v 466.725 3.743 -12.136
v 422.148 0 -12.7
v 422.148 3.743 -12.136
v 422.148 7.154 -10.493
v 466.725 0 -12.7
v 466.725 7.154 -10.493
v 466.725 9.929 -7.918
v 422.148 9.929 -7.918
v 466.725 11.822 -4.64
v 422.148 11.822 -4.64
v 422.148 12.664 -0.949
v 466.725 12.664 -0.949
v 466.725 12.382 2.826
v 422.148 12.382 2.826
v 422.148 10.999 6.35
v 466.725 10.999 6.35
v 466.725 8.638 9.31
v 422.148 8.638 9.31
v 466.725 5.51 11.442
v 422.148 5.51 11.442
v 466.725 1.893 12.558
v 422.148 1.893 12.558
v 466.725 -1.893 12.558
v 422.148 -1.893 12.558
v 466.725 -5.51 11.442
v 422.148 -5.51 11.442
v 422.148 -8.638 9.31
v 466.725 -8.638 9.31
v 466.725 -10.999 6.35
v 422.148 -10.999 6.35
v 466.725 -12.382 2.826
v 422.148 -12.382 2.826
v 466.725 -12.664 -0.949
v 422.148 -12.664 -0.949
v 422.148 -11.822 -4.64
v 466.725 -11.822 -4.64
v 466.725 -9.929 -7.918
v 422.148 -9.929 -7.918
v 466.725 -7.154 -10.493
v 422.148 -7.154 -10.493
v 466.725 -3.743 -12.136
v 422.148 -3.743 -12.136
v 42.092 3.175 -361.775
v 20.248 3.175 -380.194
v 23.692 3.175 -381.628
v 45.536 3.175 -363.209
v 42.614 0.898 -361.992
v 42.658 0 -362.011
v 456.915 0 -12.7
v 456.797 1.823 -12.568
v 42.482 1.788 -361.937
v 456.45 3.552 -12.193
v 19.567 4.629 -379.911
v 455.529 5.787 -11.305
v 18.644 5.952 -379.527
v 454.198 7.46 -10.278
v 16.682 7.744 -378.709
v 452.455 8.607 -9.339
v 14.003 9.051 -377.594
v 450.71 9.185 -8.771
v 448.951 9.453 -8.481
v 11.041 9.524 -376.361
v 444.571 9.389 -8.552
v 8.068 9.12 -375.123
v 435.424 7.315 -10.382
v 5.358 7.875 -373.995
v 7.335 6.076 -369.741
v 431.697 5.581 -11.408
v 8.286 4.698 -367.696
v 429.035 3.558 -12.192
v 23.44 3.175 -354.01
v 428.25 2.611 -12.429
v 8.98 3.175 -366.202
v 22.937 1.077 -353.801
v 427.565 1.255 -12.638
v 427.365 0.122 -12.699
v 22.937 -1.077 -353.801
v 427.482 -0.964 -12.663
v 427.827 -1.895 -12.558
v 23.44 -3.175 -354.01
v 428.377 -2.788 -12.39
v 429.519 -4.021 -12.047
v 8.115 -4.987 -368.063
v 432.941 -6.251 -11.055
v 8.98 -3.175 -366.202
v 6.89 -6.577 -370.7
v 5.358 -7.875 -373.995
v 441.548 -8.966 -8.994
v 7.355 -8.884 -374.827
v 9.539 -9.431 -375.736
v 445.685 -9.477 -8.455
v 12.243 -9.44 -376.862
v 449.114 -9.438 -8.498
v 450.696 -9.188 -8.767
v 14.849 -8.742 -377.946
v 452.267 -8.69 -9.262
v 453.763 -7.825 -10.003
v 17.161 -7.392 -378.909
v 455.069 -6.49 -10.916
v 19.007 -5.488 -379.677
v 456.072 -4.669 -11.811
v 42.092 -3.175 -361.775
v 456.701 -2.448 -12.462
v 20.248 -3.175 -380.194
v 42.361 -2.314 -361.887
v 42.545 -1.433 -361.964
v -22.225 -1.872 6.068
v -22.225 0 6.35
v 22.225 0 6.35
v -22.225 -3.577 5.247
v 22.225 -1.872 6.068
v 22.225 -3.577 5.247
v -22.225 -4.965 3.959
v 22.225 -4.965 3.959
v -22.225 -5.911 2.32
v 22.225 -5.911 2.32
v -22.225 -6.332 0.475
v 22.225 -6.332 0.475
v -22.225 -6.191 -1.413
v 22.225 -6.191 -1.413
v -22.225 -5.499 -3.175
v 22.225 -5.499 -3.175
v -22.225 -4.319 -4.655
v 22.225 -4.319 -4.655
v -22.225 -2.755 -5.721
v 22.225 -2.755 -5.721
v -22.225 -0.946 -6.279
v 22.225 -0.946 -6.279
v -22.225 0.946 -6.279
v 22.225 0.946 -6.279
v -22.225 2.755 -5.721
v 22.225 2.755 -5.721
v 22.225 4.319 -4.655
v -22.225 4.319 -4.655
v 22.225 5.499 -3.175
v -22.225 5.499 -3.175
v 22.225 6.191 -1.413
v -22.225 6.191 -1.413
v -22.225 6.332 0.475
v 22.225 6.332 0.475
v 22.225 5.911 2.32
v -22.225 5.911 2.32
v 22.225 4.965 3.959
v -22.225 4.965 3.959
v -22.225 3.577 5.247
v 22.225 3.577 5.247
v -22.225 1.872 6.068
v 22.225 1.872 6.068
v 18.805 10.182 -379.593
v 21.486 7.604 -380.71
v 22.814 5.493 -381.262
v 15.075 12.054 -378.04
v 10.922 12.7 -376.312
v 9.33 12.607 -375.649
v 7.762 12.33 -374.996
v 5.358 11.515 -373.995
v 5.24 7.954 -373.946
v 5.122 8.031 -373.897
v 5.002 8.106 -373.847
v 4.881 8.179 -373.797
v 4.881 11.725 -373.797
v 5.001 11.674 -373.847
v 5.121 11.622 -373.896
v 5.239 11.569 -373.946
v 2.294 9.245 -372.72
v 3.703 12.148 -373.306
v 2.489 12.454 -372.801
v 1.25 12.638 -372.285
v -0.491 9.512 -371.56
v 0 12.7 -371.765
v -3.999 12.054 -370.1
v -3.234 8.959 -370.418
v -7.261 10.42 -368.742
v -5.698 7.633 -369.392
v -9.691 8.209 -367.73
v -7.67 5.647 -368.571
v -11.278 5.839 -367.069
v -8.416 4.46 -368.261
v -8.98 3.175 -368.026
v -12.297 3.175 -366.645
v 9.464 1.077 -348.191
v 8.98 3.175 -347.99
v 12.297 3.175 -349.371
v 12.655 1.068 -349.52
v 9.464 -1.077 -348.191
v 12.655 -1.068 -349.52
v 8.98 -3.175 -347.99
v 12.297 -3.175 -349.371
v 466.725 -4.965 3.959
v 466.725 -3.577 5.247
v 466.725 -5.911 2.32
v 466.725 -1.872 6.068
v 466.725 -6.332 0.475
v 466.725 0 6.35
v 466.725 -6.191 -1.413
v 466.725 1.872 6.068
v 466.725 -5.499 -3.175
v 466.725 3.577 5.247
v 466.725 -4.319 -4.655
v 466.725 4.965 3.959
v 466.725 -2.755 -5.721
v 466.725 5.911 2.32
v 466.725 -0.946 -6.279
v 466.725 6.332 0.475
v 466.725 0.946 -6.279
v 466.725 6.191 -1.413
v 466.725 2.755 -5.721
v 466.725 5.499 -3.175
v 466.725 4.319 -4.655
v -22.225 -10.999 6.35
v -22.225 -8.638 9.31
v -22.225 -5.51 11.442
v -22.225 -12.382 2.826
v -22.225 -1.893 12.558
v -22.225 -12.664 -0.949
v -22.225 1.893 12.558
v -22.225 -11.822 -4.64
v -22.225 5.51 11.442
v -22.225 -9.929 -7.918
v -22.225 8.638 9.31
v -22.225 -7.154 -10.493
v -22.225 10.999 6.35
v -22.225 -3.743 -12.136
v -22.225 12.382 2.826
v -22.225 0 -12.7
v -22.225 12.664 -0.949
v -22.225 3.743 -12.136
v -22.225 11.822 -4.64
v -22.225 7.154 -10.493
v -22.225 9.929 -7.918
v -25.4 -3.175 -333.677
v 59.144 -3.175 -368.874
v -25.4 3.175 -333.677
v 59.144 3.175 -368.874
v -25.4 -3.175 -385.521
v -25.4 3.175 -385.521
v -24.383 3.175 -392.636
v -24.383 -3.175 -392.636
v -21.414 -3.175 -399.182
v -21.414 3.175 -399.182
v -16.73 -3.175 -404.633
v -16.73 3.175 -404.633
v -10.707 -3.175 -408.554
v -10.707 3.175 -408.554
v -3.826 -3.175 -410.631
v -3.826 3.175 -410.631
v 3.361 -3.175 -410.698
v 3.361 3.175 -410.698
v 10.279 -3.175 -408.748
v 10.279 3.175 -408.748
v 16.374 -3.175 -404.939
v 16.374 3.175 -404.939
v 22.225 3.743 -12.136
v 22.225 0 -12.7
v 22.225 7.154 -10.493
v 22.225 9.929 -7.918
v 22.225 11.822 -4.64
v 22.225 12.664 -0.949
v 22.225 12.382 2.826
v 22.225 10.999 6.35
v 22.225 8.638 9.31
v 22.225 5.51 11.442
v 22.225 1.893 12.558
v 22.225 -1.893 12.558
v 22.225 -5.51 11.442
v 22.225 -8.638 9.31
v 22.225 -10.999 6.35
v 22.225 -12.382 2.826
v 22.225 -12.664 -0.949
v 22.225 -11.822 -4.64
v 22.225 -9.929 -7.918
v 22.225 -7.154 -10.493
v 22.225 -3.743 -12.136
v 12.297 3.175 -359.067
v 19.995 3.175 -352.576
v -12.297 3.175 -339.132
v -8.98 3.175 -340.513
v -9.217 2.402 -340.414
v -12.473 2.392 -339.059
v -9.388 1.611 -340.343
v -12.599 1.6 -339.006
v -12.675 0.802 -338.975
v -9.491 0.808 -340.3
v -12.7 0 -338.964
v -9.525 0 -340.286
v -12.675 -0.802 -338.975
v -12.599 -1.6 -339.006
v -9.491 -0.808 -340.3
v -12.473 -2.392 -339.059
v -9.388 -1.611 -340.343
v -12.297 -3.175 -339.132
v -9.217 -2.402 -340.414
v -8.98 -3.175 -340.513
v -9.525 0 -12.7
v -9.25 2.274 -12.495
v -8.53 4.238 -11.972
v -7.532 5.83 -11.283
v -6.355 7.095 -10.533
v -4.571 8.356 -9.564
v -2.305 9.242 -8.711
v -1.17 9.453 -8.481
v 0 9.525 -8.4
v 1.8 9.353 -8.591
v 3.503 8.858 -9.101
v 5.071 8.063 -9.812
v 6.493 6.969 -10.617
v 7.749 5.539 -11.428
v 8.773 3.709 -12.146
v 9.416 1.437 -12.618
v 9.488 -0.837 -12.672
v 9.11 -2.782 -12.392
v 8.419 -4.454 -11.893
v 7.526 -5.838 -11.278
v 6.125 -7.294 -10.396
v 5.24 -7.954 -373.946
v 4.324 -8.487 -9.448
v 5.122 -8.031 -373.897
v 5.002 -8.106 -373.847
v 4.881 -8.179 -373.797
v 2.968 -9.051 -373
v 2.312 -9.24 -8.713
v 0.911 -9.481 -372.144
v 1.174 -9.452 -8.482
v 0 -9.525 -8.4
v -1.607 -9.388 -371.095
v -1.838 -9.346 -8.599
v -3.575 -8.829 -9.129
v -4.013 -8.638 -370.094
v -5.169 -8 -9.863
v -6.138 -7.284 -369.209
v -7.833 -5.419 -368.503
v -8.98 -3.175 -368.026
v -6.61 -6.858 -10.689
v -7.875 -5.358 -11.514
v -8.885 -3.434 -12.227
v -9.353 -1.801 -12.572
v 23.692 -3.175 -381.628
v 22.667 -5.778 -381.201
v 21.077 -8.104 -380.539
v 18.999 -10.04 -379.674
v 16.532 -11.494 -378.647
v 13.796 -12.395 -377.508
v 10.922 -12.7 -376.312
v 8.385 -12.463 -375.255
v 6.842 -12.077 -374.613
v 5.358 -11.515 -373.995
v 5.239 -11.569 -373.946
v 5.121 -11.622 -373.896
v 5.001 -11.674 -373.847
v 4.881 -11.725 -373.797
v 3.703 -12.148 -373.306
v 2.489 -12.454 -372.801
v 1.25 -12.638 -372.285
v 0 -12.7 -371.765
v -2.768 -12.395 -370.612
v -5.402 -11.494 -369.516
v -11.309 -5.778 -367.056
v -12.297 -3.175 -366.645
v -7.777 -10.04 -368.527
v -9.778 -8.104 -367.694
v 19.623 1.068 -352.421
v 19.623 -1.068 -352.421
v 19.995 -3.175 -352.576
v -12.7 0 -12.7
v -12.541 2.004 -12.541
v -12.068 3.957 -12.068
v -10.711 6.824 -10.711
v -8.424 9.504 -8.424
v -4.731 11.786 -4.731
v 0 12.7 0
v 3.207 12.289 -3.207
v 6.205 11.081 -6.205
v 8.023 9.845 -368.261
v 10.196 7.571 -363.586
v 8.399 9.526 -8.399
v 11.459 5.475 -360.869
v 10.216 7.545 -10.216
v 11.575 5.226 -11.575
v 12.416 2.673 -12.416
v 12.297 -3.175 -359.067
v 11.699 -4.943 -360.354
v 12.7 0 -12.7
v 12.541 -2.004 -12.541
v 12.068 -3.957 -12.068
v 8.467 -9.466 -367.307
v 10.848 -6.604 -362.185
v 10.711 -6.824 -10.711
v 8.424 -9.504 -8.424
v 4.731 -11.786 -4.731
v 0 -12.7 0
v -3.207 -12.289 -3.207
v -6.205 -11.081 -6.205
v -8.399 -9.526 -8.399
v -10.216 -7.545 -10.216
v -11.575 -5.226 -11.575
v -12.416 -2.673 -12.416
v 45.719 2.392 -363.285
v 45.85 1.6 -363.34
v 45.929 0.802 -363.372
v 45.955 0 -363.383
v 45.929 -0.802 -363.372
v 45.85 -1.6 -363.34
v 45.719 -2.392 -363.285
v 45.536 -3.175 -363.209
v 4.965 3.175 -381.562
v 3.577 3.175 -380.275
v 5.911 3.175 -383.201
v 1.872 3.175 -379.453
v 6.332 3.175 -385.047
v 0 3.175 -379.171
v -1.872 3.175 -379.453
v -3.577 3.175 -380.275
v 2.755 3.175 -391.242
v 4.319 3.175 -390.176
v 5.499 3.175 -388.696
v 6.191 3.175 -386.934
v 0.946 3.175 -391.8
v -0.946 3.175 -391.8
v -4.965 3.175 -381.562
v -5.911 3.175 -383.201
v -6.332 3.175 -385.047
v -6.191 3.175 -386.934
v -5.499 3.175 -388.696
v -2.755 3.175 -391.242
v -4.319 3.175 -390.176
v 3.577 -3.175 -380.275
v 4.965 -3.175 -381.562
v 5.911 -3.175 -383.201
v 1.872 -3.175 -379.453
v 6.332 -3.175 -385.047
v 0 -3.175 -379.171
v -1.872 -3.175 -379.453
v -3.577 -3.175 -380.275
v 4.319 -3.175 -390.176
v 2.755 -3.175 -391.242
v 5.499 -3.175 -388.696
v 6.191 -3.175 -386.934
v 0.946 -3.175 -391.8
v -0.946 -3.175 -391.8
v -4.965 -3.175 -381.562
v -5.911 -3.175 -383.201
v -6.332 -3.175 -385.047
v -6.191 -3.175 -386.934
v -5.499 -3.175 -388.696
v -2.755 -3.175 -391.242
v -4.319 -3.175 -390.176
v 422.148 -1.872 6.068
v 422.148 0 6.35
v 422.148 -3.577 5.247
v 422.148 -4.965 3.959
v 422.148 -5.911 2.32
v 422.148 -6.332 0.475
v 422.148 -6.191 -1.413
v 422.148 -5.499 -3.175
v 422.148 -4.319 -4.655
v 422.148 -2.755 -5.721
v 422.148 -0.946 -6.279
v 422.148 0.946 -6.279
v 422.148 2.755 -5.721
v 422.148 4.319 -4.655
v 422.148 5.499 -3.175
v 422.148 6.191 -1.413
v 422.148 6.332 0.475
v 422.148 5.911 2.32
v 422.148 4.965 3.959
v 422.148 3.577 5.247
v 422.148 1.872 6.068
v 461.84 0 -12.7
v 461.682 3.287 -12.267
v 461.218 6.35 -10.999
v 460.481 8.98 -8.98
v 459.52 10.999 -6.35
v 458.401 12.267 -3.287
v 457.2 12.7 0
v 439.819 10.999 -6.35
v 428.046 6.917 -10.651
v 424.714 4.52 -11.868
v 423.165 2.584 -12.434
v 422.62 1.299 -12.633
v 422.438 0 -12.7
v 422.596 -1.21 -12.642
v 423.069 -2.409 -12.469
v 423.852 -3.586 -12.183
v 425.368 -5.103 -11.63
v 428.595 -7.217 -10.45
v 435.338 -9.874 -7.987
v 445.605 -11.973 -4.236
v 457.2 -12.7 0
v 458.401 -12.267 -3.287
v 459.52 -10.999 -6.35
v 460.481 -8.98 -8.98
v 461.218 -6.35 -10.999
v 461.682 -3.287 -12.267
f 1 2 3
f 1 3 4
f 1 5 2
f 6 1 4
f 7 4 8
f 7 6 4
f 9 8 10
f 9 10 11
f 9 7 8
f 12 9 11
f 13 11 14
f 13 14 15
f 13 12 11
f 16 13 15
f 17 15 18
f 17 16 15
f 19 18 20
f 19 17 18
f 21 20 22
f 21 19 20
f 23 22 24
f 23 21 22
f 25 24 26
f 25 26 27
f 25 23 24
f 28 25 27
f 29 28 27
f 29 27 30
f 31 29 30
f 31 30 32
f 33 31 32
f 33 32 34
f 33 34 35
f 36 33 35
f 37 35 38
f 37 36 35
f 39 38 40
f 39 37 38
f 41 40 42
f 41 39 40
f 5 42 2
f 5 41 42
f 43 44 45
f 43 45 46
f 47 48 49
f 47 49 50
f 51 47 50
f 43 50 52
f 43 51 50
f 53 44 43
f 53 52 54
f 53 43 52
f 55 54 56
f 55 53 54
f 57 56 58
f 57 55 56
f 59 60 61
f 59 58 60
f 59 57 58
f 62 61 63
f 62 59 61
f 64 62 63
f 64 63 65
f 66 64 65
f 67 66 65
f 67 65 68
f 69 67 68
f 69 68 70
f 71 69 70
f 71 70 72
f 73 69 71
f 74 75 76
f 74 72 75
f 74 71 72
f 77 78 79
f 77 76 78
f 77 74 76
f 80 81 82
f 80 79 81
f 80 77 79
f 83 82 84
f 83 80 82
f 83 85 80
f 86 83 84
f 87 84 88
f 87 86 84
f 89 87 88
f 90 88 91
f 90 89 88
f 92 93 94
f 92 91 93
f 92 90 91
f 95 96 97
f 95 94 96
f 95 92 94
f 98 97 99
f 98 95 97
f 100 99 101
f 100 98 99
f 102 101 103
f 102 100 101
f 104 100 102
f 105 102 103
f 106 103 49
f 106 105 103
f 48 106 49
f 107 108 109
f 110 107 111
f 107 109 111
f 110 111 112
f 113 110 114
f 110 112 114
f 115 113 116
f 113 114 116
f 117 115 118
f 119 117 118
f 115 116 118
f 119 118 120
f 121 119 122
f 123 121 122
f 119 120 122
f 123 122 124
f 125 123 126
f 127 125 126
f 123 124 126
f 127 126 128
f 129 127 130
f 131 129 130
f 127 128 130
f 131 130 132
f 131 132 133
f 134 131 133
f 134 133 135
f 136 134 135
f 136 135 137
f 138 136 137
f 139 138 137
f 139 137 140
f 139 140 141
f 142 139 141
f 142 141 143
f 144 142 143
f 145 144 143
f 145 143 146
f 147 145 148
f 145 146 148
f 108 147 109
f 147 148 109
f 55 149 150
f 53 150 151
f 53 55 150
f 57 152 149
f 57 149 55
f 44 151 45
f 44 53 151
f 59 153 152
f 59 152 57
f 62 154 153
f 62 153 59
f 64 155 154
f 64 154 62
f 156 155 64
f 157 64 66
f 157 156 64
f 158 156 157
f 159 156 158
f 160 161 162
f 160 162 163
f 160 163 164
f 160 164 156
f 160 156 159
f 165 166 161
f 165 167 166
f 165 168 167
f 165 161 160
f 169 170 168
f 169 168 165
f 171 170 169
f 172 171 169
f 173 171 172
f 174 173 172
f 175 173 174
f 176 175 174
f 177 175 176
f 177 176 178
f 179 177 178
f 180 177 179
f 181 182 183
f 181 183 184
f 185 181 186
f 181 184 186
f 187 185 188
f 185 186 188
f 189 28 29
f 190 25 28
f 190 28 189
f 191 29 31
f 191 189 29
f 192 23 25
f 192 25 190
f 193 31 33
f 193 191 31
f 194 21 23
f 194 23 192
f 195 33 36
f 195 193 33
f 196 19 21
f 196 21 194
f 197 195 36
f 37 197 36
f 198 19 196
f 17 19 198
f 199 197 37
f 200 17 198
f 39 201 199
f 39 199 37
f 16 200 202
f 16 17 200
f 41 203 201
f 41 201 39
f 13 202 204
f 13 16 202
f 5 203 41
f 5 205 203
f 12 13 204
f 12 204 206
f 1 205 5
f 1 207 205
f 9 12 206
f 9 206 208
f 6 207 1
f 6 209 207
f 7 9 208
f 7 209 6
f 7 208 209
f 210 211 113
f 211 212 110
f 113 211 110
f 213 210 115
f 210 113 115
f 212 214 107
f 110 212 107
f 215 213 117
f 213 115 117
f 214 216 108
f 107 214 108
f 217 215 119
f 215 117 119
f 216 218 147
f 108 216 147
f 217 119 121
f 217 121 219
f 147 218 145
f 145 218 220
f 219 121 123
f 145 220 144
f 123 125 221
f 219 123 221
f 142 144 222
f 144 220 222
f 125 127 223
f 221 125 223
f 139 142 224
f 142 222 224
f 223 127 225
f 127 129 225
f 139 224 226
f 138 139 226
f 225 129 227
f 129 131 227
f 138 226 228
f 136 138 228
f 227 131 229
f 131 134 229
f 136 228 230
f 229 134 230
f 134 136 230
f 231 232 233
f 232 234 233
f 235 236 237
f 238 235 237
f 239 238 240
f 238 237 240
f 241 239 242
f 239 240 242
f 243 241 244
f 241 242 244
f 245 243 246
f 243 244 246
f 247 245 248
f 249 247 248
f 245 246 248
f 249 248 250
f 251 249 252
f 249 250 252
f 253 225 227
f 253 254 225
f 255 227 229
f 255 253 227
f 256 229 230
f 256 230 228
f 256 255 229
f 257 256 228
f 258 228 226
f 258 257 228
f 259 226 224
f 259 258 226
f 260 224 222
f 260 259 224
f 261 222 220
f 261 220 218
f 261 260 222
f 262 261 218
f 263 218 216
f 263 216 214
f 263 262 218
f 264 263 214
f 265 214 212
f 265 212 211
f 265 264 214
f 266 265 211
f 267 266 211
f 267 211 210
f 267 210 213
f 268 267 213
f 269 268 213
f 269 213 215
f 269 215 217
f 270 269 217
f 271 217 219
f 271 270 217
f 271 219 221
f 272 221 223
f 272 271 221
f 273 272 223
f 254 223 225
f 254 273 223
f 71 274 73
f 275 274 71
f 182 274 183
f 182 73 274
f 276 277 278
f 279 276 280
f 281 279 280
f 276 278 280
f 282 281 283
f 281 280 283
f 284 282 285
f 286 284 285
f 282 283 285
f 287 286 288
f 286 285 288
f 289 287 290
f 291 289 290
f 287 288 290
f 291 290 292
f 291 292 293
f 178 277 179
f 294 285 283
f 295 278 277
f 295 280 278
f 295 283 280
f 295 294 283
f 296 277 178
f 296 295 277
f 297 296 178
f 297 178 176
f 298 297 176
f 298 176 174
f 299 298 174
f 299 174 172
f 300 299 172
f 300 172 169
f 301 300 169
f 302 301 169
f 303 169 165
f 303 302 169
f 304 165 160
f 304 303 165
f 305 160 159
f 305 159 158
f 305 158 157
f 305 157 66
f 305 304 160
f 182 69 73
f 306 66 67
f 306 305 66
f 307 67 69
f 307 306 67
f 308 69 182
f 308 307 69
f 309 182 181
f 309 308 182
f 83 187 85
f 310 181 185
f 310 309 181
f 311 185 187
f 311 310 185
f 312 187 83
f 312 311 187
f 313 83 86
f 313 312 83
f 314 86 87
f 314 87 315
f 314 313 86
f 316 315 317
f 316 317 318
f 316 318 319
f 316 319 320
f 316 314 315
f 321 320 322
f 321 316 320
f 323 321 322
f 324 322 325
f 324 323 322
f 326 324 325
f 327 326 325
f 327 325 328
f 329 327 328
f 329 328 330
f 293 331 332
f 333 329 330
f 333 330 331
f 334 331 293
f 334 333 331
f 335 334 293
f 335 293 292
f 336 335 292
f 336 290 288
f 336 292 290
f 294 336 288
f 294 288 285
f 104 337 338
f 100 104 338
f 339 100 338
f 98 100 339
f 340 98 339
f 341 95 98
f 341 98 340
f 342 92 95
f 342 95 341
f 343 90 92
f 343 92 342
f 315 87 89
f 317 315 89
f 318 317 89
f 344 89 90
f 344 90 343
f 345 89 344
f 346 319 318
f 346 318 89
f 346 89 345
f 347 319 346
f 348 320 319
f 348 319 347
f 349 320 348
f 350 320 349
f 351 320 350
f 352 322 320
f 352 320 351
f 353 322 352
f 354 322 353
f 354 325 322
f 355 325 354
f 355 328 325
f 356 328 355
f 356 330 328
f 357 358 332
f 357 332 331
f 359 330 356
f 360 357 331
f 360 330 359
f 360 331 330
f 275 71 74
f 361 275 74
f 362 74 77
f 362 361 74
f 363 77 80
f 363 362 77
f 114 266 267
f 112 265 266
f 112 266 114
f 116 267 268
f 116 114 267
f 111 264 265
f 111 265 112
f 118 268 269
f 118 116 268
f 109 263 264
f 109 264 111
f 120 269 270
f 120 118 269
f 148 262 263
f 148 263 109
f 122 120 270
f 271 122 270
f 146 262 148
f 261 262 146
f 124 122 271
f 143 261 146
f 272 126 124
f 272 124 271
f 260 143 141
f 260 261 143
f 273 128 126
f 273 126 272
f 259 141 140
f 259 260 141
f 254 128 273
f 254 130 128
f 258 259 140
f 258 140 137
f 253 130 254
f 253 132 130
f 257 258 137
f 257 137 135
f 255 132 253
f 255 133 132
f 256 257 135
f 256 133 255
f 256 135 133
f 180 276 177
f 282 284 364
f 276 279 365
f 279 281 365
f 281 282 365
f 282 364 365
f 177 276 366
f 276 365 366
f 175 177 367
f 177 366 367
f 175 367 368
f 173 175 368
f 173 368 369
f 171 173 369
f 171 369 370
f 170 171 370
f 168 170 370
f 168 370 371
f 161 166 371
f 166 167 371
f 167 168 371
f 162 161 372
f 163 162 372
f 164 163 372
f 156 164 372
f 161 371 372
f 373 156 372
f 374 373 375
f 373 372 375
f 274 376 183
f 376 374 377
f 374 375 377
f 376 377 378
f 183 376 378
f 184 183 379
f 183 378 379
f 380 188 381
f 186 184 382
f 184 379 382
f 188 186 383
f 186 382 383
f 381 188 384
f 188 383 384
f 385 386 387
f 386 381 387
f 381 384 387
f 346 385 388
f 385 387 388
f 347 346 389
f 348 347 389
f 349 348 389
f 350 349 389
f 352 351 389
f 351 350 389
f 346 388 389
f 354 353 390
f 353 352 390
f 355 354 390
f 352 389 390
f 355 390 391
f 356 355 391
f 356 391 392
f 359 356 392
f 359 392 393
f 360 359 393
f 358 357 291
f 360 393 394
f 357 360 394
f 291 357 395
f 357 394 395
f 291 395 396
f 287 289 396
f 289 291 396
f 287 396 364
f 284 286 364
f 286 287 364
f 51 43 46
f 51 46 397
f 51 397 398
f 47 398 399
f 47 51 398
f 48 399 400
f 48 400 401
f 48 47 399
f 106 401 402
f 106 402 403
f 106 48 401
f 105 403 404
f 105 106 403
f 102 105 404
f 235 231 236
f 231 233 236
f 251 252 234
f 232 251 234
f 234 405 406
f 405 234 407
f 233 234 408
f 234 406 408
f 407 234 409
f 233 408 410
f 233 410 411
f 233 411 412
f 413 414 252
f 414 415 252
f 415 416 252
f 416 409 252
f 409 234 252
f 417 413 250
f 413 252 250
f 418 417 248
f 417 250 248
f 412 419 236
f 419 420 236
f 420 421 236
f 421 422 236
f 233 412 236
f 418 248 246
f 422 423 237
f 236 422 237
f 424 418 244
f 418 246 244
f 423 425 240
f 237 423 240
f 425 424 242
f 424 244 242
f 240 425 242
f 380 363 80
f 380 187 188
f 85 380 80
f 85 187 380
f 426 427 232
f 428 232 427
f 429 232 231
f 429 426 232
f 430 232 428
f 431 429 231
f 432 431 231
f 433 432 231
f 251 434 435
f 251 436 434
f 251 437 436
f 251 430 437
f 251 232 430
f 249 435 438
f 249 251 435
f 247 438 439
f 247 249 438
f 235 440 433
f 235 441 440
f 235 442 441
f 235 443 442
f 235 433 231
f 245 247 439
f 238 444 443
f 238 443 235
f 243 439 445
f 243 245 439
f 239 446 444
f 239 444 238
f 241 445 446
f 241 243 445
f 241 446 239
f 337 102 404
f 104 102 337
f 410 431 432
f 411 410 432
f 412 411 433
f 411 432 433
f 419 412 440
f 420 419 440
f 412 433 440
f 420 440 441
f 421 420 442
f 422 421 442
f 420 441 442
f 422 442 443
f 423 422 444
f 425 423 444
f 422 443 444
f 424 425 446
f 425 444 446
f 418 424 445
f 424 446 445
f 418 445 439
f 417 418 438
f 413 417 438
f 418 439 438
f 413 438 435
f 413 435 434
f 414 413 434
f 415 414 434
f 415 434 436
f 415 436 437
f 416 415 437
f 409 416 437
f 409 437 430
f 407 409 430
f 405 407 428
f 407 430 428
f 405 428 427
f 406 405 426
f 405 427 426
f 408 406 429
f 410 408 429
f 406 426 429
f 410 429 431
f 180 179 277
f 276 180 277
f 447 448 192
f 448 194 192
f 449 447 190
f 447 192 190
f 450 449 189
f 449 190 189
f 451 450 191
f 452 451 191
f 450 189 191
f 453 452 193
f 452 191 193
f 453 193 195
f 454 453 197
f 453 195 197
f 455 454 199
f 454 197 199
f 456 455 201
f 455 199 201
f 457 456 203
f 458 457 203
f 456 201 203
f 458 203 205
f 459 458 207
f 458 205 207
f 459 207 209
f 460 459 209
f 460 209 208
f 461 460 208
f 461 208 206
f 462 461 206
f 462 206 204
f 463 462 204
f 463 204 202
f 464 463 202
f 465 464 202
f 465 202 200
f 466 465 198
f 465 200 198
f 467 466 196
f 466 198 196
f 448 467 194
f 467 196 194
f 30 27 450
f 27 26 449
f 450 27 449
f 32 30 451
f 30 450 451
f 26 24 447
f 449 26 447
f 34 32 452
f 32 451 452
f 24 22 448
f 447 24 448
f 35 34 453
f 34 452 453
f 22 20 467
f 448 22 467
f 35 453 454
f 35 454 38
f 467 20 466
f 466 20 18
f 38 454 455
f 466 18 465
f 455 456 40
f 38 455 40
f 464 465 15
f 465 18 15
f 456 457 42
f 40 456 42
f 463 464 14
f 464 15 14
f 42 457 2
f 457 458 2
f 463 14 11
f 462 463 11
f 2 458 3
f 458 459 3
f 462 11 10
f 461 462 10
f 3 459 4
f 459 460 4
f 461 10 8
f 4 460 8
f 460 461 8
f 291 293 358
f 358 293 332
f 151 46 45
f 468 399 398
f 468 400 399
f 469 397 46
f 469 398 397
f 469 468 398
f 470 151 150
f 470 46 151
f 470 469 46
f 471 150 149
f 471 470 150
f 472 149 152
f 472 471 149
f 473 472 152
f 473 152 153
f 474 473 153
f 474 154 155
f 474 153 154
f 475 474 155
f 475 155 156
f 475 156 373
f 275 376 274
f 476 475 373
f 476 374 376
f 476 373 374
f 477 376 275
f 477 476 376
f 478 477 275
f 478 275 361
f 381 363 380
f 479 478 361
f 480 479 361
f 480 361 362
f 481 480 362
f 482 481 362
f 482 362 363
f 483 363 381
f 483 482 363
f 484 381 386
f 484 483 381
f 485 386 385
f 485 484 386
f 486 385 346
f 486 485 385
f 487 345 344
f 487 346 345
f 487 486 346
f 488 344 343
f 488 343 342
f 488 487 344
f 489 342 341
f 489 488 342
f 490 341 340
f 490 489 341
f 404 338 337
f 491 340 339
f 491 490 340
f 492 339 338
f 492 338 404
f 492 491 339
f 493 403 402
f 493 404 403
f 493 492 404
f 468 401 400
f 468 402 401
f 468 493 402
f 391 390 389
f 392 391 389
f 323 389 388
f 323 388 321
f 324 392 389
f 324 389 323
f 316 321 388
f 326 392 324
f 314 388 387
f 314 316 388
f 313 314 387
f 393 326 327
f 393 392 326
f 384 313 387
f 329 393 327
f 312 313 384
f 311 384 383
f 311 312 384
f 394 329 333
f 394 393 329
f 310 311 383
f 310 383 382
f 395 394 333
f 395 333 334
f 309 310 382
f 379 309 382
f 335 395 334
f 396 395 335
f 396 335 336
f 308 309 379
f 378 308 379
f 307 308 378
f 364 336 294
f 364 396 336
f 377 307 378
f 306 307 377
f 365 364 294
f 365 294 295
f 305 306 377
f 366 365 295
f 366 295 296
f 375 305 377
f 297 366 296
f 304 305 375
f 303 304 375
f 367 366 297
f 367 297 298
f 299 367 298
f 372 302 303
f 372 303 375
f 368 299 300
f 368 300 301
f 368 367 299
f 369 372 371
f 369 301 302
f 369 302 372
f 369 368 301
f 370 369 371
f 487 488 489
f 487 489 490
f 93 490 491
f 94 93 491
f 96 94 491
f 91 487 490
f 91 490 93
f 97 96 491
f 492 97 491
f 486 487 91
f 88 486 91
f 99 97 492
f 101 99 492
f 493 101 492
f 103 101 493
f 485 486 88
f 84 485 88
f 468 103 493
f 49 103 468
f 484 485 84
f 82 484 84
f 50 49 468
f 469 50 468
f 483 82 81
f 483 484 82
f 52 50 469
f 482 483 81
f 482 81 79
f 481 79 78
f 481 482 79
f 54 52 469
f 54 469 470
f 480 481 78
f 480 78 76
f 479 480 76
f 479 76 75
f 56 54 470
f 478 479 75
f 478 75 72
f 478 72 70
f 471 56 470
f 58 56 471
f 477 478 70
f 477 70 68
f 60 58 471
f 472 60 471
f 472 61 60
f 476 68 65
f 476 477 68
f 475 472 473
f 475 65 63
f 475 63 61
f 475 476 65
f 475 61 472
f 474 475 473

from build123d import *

# Parameters (mm, degrees)
SKETCH11_ON_SEGMENT_1_R         = 12.7
SKETCH11_ON_SEGMENT_1_R_2       = 9.525
STRUCTURAL_MEMBER1_DEPTH        = 425.159349585
SKETCH11_R                      = 12.7
SKETCH11_R_2                    = 9.525
STRUCTURAL_MEMBER1_2_DEPTH      = 598.045513025
STRUCTURAL_MEMBER1_2_DEPTH_BACK = 39.638149585
CUT_EXTRUDE1_DEPTH              = 611.698909876
CUT_EXTRUDE1_DEPTH_BACK         = 611.698909876
BOSS_EXTRUDE1_DEPTH             = 3.175
BOSS_EXTRUDE1_DEPTH_BACK        = 3.175
SKETCH14_W                      = 6.35
SKETCH14_H                      = 15.875
SKETCH16_R                      = 12.7
CUT_EXTRUDE2_DEPTH              = 621.968967697
CUT_EXTRUDE2_DEPTH_BACK         = 621.968967697
SKETCH17_R                      = 12.7
BOSS_EXTRUDE2_DEPTH             = 22.225
BOSS_EXTRUDE2_DEPTH_BACK        = 22.225
SKETCH18_R                      = 12.7
BOSS_EXTRUDE3_DEPTH             = 9.525
BOSS_EXTRUDE3_DEPTH_BACK        = 35.052
SKETCH19_W                      = 6.35
SKETCH19_H                      = 488.95


with BuildPart() as part:
    # Sketch11 on segment 1 (carried to segment 1) → Structural Member1 (new body)
    with BuildSketch(Plane(origin=(0, 0, 0), x_dir=(-1, 0, 0), z_dir=(0, 0, -1))):
        Circle(SKETCH11_ON_SEGMENT_1_R)
        Circle(SKETCH11_ON_SEGMENT_1_R_2, mode=Mode.SUBTRACT)
    extrude(amount=STRUCTURAL_MEMBER1_DEPTH)

    # Structural Member1 mitre 1
    split(bisect_by=Plane(origin=(0, 0, -385.5212), x_dir=(0, -1, 0), z_dir=(-0.906817297, 0, 0.421523891)), keep=Keep.TOP)


with BuildPart() as body_2:
    # Sketch11 → Structural Member1 2 (new, two sides)
    with BuildSketch(Plane(origin=(0, 0, -385.5212), x_dir=(0.6446352185637546, 0, -0.7644903105908277), z_dir=(0.7644903105908278, 0, 0.6446352185637547))) as structural_member1_2_sk:
        Circle(SKETCH11_R)
        Circle(SKETCH11_R_2, mode=Mode.SUBTRACT)
    extrude(amount=STRUCTURAL_MEMBER1_2_DEPTH)
    extrude(structural_member1_2_sk.sketch, amount=-STRUCTURAL_MEMBER1_2_DEPTH_BACK)

    # Structural Member1 2 mitre 1
    split(bisect_by=Plane(origin=(0, 0, -385.5212), x_dir=(0, 1, 0), z_dir=(0.906817297, 0, -0.421523891)), keep=Keep.TOP)


with BuildPart() as part_1:
    add(part.part)

    # Structural Member1 as one body: union body 2
    add(body_2.part)

    # Sketch13 → Cut-Extrude1 (cut, two sides)
    with BuildSketch(Plane(origin=(0, 0, -385.5212), x_dir=(0.3843431928760582, 0, 0.9231902892090218), z_dir=(-0.9231902892090218, 0, 0.3843431928760582))) as cut_extrude1_sk:
        Polygon((12.7, 3.175), (38.1, 3.175), (38.1, -3.175), (12.7, -3.175), (12.7, -12.7), (-30.103915168, -12.7), (-30.103915168, 12.7), (12.7, 12.7), align=None)
    extrude(amount=CUT_EXTRUDE1_DEPTH, mode=Mode.SUBTRACT)
    extrude(cut_extrude1_sk.sketch, amount=-CUT_EXTRUDE1_DEPTH_BACK, mode=Mode.SUBTRACT)

    # Sketch16 → Cut-Extrude2 (cut, two sides)
    with BuildSketch(Plane(origin=(0, 0, 0), x_dir=(0, 0, -1), z_dir=(1, 0, 0))) as cut_extrude2_sk:
        Circle(SKETCH16_R)
    extrude(amount=CUT_EXTRUDE2_DEPTH, mode=Mode.SUBTRACT)
    extrude(cut_extrude2_sk.sketch, amount=-CUT_EXTRUDE2_DEPTH_BACK, mode=Mode.SUBTRACT)


with BuildPart() as body_2_2:
    # Sketch12 → Boss-Extrude1 (new, two sides)
    with BuildSketch(Plane(origin=(0, 0, 0), x_dir=(1, 0, 0), z_dir=(0, 1, 0))) as boss_extrude1_sk:
        with BuildLine():
            Line((16.373734552, 404.939253889), (59.144220595, 368.874229602))
            Line((59.144220595, 368.874229602), (-25.4, 333.676723668))
            Line((-25.4, 333.676723668), (-25.4, 385.5212))
            ThreePointArc((-25.4, 385.5212), (-10.706706832, 408.554359332), (16.373734552, 404.939253889))
        make_face()
    extrude(amount=BOSS_EXTRUDE1_DEPTH)
    extrude(boss_extrude1_sk.sketch, amount=-BOSS_EXTRUDE1_DEPTH_BACK)

    # Sketch14 → 1_2 _0.5_ Diameter Hole1 (revolve, cut)
    with BuildSketch(Plane(origin=(0, 3.175, -385.5212), x_dir=(0, 0, 1), z_dir=(1, 0, 0))):
        with Locations((3.175, 7.9375)):
            Rectangle(SKETCH14_W, SKETCH14_H)
    revolve(axis=Axis((0, 9.525, -385.5212), (0, -1, 0)), mode=Mode.SUBTRACT)


with BuildPart() as body_3:
    # Sketch17 → Boss-Extrude2 (new, two sides)
    with BuildSketch(Plane(origin=(0, 0, 0), x_dir=(0, 0, -1), z_dir=(1, 0, 0))) as boss_extrude2_sk:
        Circle(SKETCH17_R)
    extrude(amount=BOSS_EXTRUDE2_DEPTH)
    extrude(boss_extrude2_sk.sketch, amount=-BOSS_EXTRUDE2_DEPTH_BACK)


with BuildPart() as body_4:
    # Sketch18 → Boss-Extrude3 (new, two sides)
    with BuildSketch(Plane(origin=(457.2, 0, 0), x_dir=(0, 0, -1), z_dir=(1, 0, 0))) as boss_extrude3_sk:
        Circle(SKETCH18_R)
    extrude(amount=BOSS_EXTRUDE3_DEPTH)
    extrude(boss_extrude3_sk.sketch, amount=-BOSS_EXTRUDE3_DEPTH_BACK)


with BuildPart() as f_1_2_0_5_diameter_hole2_tool:
    # Sketch19 → 1_2 _0.5_ Diameter Hole2 (revolve)
    with BuildSketch(Plane(origin=(-22.225, 0, 0), x_dir=(0, 0, 1), z_dir=(0, 1, 0))):
        with Locations((3.175, 244.475)):
            Rectangle(SKETCH19_W, SKETCH19_H)
    revolve(axis=Axis((-28.575, 0, 0), (1, 0, 0)))


with BuildPart() as body_3_1:
    add(body_3.part)

    # 1_2 _0.5_ Diameter Hole2: cut by f_1_2_0_5_diameter_hole2_tool
    add(f_1_2_0_5_diameter_hole2_tool.part, mode=Mode.SUBTRACT)


with BuildPart() as body_4_1:
    add(body_4.part)

    # 1_2 _0.5_ Diameter Hole2: cut by f_1_2_0_5_diameter_hole2_tool
    add(f_1_2_0_5_diameter_hole2_tool.part, mode=Mode.SUBTRACT)


solid = Compound([part_1.part, body_2_2.part, body_3_1.part, body_4_1.part])
